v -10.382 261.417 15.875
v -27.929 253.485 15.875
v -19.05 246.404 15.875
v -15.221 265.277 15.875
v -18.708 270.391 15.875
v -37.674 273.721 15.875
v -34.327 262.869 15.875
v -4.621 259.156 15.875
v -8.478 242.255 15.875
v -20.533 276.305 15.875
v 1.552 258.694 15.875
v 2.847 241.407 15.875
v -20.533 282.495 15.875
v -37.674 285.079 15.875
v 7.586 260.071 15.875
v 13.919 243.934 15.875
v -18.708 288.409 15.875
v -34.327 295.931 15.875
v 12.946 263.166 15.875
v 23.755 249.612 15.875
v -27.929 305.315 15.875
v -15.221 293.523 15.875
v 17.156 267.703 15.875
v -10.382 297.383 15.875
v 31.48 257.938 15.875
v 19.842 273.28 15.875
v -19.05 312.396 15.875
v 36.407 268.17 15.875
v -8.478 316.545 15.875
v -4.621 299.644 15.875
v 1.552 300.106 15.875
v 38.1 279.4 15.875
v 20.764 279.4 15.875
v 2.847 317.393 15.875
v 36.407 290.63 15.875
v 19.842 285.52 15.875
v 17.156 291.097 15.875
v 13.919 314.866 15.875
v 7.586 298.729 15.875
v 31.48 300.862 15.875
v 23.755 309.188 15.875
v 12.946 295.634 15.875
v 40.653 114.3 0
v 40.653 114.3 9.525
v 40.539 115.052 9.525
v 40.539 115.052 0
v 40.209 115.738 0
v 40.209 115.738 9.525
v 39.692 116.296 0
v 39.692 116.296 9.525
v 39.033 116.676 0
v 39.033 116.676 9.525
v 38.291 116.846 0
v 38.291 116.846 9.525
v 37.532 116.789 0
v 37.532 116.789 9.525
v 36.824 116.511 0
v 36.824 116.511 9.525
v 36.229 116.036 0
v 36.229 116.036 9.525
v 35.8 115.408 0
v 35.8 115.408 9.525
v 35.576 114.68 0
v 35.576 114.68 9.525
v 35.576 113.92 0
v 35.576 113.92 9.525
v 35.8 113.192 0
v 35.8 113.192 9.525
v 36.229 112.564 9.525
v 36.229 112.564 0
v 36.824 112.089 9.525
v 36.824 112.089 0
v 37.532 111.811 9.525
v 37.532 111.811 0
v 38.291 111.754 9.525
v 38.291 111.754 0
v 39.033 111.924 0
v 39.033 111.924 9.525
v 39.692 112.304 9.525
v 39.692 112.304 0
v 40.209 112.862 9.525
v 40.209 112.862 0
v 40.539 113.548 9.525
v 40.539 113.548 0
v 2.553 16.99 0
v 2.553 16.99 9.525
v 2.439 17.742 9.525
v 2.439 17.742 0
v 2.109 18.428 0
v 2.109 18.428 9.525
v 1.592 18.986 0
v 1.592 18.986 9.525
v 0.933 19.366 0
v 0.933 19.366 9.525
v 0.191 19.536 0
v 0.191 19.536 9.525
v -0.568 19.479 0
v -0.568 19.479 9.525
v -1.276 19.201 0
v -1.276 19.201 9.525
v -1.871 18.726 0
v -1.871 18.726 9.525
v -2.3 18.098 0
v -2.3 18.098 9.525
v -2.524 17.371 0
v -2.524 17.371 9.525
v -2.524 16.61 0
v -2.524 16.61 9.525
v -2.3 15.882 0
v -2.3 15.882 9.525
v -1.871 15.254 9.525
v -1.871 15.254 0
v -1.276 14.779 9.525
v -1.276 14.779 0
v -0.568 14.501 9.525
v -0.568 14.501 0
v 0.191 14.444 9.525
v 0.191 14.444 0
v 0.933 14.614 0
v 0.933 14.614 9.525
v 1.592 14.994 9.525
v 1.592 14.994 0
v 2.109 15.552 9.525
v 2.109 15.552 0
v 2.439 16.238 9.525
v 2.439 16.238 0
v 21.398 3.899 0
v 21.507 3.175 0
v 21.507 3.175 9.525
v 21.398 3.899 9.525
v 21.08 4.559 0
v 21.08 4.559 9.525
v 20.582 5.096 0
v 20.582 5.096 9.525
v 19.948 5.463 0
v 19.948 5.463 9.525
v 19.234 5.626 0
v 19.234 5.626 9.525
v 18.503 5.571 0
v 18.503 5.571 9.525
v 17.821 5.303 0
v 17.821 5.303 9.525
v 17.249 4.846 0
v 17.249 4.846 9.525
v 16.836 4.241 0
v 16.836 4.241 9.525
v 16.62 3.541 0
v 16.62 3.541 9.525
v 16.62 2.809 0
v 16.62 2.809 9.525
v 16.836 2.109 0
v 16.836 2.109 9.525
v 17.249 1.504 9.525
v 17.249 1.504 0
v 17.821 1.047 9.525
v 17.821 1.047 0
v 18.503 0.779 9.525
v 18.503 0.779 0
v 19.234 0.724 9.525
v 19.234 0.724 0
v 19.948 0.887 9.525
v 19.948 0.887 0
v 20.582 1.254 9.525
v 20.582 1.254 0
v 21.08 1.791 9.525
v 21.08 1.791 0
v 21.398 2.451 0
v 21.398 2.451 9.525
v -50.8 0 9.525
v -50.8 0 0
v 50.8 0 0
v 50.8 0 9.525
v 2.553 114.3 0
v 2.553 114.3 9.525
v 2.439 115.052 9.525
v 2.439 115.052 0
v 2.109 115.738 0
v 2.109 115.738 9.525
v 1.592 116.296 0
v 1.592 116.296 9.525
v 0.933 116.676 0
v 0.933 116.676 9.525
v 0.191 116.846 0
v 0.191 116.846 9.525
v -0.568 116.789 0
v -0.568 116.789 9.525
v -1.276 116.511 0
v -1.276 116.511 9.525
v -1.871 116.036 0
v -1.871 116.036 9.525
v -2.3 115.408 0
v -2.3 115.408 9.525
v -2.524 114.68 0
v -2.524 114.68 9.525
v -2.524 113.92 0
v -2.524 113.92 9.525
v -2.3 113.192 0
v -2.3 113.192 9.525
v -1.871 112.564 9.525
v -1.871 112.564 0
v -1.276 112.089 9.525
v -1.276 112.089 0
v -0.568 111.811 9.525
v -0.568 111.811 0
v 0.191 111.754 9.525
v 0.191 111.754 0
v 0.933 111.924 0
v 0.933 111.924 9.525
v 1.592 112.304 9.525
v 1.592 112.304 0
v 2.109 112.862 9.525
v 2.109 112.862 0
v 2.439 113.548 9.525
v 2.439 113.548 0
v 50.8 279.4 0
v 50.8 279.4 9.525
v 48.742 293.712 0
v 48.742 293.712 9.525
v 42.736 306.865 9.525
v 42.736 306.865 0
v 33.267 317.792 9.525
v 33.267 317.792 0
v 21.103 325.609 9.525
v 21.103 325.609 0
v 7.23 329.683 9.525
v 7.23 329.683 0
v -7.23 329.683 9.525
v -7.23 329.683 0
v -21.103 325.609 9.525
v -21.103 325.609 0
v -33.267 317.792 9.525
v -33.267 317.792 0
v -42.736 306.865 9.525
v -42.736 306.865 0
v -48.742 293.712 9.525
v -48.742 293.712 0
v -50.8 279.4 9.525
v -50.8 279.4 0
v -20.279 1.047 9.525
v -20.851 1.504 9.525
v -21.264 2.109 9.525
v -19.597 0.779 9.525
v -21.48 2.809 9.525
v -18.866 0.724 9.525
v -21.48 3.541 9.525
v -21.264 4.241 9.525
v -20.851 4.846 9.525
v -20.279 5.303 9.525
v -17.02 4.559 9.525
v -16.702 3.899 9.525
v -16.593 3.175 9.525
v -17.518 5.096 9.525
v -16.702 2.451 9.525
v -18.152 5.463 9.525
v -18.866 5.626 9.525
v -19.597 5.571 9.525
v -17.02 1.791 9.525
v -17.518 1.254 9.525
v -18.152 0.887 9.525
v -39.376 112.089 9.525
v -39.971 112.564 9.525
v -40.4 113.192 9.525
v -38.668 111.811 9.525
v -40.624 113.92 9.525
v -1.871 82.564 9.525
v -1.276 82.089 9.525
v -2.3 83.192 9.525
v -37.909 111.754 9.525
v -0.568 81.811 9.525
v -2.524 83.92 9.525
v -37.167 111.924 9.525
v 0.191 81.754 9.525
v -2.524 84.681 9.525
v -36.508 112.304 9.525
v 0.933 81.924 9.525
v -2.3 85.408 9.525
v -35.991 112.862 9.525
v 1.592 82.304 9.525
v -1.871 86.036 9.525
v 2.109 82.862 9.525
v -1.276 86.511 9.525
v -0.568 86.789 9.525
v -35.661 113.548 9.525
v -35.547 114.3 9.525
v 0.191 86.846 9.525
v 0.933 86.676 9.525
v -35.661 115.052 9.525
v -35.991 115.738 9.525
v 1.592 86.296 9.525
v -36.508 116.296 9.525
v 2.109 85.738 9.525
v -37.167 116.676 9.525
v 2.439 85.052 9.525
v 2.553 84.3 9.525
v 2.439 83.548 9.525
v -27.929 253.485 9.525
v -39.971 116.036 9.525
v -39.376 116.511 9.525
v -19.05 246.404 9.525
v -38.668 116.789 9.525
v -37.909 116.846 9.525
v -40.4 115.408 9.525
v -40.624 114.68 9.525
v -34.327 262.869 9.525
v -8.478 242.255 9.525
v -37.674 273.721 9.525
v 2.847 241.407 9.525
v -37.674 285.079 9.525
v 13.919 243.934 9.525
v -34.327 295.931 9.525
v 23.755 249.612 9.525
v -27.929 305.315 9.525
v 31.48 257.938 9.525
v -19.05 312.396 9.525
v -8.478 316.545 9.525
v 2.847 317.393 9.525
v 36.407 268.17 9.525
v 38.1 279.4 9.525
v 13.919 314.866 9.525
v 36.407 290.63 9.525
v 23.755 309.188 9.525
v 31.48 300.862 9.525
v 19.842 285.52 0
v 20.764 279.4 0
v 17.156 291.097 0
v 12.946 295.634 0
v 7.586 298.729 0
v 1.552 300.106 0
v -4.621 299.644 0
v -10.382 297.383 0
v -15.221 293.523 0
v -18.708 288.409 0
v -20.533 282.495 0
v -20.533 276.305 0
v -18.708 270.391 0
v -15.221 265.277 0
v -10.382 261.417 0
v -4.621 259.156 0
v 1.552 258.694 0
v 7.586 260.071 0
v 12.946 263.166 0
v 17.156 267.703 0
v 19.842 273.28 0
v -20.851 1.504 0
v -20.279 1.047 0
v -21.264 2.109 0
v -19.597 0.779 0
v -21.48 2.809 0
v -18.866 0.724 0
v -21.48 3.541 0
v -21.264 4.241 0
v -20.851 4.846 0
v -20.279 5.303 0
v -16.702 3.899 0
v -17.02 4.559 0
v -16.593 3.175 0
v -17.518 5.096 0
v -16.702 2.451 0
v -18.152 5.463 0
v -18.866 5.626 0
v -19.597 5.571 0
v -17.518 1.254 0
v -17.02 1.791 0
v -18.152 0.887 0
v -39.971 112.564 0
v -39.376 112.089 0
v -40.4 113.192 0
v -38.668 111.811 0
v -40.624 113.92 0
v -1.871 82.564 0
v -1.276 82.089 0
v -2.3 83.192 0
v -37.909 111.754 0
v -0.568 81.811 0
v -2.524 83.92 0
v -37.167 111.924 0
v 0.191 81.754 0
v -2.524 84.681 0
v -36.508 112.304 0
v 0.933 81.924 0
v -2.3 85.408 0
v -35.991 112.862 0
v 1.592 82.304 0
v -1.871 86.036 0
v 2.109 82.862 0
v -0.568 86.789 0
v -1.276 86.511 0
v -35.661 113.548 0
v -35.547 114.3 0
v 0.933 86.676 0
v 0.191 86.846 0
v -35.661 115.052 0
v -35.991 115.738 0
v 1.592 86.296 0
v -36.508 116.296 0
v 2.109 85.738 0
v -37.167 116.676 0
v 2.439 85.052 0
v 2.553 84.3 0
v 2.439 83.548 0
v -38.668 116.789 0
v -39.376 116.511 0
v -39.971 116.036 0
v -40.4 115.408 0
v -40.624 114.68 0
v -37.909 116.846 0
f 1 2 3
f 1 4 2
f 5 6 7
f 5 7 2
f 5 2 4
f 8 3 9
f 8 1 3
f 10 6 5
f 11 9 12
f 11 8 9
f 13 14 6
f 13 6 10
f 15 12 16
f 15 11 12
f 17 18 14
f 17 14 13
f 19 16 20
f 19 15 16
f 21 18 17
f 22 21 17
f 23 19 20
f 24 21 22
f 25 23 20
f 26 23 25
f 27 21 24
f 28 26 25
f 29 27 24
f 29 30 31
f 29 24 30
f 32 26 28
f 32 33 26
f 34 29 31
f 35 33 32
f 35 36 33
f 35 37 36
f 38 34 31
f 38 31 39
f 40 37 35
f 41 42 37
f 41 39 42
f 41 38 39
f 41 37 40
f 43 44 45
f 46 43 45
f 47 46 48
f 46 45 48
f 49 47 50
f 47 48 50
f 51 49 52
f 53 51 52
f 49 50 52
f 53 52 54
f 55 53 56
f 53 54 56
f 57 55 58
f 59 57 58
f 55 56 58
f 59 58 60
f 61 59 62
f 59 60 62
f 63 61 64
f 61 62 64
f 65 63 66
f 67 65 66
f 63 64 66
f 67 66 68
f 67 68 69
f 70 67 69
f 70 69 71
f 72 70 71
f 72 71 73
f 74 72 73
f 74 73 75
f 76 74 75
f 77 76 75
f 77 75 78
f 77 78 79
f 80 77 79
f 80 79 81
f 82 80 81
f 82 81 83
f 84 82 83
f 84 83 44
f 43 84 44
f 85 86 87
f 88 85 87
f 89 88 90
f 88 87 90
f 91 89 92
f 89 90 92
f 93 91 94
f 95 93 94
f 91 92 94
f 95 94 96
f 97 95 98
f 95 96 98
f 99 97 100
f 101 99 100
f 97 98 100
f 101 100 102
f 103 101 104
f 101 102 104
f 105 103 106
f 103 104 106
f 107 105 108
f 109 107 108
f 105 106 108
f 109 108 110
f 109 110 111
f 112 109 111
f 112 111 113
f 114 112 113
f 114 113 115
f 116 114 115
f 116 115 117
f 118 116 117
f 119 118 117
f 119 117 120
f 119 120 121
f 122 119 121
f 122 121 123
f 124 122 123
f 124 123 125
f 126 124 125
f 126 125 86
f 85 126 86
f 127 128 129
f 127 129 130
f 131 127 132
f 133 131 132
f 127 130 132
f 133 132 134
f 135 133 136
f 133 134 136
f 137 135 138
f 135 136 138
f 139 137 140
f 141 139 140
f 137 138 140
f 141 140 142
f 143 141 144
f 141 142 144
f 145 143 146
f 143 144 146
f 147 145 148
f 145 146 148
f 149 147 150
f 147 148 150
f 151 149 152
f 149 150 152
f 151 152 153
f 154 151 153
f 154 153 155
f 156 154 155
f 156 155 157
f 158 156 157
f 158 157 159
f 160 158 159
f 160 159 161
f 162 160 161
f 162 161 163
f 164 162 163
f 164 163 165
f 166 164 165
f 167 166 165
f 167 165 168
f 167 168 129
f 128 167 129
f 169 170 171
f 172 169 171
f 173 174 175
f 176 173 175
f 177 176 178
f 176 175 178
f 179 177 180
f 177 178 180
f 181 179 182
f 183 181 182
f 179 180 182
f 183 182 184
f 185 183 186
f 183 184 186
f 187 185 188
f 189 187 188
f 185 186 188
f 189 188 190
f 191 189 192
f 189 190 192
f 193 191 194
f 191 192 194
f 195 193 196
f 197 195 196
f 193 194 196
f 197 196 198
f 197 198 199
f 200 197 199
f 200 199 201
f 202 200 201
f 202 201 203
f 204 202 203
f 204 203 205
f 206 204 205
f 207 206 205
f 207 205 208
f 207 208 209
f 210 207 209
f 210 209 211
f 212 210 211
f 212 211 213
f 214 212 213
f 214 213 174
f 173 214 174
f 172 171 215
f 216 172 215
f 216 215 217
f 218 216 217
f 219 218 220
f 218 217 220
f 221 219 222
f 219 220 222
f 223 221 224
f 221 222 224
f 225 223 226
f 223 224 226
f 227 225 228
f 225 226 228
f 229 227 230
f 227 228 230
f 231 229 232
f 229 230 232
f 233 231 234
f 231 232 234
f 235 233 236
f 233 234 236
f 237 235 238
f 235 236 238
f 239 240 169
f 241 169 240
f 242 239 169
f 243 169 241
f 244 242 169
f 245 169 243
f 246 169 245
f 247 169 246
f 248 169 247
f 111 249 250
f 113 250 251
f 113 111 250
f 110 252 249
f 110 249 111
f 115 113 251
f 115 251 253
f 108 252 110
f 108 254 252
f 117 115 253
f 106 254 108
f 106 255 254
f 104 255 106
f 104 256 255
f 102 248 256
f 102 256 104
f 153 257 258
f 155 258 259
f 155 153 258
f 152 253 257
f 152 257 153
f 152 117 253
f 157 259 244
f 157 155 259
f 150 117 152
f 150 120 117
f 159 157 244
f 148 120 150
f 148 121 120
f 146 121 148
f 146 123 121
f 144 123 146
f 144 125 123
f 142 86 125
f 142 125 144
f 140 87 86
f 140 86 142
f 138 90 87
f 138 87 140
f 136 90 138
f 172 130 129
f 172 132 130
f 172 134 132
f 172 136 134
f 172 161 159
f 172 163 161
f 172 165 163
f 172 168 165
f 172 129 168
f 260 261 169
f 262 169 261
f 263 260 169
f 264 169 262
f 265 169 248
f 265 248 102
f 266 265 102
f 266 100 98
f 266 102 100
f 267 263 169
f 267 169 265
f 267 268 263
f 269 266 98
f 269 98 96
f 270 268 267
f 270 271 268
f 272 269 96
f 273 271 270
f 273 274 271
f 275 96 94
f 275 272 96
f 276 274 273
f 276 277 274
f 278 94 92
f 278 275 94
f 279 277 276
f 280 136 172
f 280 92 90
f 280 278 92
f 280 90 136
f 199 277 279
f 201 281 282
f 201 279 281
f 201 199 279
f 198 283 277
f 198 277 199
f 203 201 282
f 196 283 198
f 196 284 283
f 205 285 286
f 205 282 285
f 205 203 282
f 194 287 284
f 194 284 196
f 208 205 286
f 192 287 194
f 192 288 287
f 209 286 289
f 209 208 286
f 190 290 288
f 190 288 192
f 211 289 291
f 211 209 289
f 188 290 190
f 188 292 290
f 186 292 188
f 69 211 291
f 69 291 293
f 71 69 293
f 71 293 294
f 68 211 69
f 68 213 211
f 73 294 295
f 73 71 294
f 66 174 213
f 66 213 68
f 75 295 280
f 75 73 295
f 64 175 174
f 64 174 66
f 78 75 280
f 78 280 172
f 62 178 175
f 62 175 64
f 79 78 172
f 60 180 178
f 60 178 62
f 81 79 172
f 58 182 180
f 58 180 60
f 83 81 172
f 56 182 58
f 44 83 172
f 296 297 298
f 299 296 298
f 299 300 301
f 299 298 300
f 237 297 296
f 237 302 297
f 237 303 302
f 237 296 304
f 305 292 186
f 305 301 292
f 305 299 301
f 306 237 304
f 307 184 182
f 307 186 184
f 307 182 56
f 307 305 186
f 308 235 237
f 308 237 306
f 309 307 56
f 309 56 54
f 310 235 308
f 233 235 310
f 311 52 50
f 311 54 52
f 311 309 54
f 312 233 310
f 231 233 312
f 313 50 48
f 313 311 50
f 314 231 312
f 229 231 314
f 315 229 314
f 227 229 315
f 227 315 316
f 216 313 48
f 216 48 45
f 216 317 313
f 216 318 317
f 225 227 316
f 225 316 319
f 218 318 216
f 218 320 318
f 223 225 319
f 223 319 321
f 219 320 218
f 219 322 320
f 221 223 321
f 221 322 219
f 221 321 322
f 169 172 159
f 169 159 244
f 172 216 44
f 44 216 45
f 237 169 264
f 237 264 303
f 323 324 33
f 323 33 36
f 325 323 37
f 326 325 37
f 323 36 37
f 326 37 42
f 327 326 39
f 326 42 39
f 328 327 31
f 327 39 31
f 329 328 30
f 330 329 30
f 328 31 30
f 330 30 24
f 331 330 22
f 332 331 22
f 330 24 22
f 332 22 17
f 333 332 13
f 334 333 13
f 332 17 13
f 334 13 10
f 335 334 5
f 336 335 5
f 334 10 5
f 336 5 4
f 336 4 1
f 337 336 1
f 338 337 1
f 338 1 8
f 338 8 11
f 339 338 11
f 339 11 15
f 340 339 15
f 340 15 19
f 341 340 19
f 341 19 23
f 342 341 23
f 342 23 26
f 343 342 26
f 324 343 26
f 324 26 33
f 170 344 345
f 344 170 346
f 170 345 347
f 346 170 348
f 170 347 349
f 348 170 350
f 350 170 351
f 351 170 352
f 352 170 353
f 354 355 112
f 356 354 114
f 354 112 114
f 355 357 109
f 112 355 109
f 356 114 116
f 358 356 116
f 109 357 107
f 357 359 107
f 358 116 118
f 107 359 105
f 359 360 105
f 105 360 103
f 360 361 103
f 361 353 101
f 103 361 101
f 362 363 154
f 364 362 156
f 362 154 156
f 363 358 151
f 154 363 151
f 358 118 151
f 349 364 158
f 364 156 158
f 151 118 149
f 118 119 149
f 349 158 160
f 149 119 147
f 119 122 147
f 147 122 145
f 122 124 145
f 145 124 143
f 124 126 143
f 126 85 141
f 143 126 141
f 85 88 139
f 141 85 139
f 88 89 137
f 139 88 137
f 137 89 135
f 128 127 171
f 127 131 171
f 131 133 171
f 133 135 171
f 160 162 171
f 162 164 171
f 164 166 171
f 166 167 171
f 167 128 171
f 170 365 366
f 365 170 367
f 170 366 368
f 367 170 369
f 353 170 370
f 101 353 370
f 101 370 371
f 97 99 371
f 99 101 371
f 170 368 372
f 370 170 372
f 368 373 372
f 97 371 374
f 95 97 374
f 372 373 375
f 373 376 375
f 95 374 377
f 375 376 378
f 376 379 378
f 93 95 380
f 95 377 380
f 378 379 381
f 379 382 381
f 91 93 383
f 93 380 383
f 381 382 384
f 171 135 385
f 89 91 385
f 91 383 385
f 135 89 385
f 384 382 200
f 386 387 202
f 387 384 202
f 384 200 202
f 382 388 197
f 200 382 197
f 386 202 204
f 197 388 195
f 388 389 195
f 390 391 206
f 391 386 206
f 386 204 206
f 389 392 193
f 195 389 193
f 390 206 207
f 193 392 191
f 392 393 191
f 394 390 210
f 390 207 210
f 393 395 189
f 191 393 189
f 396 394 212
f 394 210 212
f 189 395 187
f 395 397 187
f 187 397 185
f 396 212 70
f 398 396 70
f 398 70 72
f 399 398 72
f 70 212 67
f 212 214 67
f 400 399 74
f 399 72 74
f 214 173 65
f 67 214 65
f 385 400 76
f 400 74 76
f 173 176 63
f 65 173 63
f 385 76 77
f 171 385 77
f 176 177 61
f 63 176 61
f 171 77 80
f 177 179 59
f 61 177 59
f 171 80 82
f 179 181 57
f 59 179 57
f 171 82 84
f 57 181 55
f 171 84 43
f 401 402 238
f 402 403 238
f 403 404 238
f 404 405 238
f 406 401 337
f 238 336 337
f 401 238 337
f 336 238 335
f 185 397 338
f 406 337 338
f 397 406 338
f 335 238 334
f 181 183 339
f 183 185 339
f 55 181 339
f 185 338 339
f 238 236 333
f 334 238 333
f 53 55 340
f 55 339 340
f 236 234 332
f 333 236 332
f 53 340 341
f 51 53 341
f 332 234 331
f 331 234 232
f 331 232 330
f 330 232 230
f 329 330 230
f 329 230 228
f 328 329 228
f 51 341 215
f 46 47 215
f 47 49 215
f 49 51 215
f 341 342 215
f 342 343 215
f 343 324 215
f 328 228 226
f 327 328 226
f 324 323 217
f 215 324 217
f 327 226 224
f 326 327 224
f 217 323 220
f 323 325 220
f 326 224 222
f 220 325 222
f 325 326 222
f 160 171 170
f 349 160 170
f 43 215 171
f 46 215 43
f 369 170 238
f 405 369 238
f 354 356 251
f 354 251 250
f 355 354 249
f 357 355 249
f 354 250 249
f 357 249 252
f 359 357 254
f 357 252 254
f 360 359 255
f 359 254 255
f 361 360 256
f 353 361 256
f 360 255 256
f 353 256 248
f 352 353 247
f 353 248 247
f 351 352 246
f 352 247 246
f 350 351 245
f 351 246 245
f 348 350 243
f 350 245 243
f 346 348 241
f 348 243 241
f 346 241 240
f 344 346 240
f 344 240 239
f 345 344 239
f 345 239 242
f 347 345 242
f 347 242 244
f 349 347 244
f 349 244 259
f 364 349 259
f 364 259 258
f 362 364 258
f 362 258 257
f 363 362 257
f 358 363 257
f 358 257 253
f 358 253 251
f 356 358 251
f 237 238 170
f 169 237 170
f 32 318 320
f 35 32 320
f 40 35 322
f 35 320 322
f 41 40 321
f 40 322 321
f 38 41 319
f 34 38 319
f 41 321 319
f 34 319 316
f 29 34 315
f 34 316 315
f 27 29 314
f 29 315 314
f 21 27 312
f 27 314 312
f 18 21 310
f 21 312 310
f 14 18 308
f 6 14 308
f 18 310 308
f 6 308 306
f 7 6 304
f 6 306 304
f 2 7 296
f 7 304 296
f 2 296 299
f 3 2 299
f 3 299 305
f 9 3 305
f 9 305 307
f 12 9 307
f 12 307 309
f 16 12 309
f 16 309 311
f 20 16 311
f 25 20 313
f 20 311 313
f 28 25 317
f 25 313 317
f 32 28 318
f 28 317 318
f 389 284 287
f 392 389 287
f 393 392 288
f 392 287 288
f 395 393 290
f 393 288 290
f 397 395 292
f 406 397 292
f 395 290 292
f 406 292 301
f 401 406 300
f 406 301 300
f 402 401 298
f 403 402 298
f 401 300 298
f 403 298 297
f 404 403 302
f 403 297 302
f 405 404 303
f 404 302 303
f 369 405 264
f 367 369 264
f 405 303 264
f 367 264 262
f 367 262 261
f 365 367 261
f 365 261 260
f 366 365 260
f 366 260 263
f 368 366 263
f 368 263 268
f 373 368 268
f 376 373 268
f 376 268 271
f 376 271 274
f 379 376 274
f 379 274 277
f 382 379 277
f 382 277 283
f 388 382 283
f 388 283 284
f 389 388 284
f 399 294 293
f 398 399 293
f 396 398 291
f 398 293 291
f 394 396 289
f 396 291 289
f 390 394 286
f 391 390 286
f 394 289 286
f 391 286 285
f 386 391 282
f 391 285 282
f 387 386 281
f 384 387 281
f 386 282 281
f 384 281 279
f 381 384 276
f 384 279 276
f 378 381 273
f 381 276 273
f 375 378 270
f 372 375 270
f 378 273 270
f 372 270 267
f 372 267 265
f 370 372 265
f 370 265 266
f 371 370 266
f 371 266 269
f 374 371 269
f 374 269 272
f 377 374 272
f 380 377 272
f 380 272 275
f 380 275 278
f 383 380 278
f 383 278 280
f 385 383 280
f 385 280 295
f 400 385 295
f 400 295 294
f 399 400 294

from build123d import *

# Parameters (mm, degrees)
BOSS_EXTRUDE1_DEPTH              = 9.525
SKETCH2_R                        = 38.1
BOSS_EXTRUDE2_DEPTH              = 6.35
SKETCH3_R                        = 20.7645
CUT_EXTRUDE1_DEPTH               = 335.461799949
F_10_0_1935_DIAMETER_HOLE1_D     = 4.9149
F_10_0_1935_DIAMETER_HOLE1_DEPTH = 10.16
F_10_0_1935_DIAMETER_HOLE1_TIP   = 1.476584928
F_10_CLEARANCE_HOLE1_D           = 5.1054


with BuildPart() as part:
    # Sketch1 → Boss-Extrude1 (new body)
    with BuildSketch(Plane.XY):
        with BuildLine():
            Line((-50.8, 0), (50.8, 0))
            Line((50.8, 0), (50.8, 279.4))
            ThreePointArc((50.8, 279.4), (0, 330.2), (-50.8, 279.4))
            Line((-50.8, 279.4), (-50.8, 0))
        make_face()
    extrude(amount=BOSS_EXTRUDE1_DEPTH)

    # Sketch2 → Boss-Extrude2 (add)
    with BuildSketch(Plane.XY.offset(9.525)):
        with Locations((0, 279.4)):
            Circle(SKETCH2_R)
    extrude(amount=BOSS_EXTRUDE2_DEPTH)

    # Sketch3 → Cut-Extrude1 (cut, through all)
    with BuildSketch(Plane.XY.offset(15.875)):
        with Locations((0, 279.4)):
            Circle(SKETCH3_R)
    extrude(amount=-CUT_EXTRUDE1_DEPTH, mode=Mode.SUBTRACT)

    # #10 (0.1935) Diameter Hole1
    with Locations(Plane(origin=(0, 0, 0), x_dir=(-1, 0, 0), z_dir=(0, 0, -1))):
        with Locations((-19.05, 3.175), (19.05, 3.175)):
            Hole(F_10_0_1935_DIAMETER_HOLE1_D / 2, depth=F_10_0_1935_DIAMETER_HOLE1_DEPTH)
            with Locations((0, 0, -(F_10_0_1935_DIAMETER_HOLE1_DEPTH + F_10_0_1935_DIAMETER_HOLE1_TIP / 2))):  # 118° drill point
                Cone(0, F_10_0_1935_DIAMETER_HOLE1_D / 2, F_10_0_1935_DIAMETER_HOLE1_TIP, mode=Mode.SUBTRACT)

    # #10 Clearance Hole1 (through all)
    with Locations(Plane(origin=(0, 0, 0), x_dir=(-1, 0, 0), z_dir=(0, 0, -1))):
        with Locations((0, 84.30006), (0, 16.99006), (-38.1, 114.3), (0, 114.3), (38.1, 114.3)):
            Hole(F_10_CLEARANCE_HOLE1_D / 2)


solid = part.part
